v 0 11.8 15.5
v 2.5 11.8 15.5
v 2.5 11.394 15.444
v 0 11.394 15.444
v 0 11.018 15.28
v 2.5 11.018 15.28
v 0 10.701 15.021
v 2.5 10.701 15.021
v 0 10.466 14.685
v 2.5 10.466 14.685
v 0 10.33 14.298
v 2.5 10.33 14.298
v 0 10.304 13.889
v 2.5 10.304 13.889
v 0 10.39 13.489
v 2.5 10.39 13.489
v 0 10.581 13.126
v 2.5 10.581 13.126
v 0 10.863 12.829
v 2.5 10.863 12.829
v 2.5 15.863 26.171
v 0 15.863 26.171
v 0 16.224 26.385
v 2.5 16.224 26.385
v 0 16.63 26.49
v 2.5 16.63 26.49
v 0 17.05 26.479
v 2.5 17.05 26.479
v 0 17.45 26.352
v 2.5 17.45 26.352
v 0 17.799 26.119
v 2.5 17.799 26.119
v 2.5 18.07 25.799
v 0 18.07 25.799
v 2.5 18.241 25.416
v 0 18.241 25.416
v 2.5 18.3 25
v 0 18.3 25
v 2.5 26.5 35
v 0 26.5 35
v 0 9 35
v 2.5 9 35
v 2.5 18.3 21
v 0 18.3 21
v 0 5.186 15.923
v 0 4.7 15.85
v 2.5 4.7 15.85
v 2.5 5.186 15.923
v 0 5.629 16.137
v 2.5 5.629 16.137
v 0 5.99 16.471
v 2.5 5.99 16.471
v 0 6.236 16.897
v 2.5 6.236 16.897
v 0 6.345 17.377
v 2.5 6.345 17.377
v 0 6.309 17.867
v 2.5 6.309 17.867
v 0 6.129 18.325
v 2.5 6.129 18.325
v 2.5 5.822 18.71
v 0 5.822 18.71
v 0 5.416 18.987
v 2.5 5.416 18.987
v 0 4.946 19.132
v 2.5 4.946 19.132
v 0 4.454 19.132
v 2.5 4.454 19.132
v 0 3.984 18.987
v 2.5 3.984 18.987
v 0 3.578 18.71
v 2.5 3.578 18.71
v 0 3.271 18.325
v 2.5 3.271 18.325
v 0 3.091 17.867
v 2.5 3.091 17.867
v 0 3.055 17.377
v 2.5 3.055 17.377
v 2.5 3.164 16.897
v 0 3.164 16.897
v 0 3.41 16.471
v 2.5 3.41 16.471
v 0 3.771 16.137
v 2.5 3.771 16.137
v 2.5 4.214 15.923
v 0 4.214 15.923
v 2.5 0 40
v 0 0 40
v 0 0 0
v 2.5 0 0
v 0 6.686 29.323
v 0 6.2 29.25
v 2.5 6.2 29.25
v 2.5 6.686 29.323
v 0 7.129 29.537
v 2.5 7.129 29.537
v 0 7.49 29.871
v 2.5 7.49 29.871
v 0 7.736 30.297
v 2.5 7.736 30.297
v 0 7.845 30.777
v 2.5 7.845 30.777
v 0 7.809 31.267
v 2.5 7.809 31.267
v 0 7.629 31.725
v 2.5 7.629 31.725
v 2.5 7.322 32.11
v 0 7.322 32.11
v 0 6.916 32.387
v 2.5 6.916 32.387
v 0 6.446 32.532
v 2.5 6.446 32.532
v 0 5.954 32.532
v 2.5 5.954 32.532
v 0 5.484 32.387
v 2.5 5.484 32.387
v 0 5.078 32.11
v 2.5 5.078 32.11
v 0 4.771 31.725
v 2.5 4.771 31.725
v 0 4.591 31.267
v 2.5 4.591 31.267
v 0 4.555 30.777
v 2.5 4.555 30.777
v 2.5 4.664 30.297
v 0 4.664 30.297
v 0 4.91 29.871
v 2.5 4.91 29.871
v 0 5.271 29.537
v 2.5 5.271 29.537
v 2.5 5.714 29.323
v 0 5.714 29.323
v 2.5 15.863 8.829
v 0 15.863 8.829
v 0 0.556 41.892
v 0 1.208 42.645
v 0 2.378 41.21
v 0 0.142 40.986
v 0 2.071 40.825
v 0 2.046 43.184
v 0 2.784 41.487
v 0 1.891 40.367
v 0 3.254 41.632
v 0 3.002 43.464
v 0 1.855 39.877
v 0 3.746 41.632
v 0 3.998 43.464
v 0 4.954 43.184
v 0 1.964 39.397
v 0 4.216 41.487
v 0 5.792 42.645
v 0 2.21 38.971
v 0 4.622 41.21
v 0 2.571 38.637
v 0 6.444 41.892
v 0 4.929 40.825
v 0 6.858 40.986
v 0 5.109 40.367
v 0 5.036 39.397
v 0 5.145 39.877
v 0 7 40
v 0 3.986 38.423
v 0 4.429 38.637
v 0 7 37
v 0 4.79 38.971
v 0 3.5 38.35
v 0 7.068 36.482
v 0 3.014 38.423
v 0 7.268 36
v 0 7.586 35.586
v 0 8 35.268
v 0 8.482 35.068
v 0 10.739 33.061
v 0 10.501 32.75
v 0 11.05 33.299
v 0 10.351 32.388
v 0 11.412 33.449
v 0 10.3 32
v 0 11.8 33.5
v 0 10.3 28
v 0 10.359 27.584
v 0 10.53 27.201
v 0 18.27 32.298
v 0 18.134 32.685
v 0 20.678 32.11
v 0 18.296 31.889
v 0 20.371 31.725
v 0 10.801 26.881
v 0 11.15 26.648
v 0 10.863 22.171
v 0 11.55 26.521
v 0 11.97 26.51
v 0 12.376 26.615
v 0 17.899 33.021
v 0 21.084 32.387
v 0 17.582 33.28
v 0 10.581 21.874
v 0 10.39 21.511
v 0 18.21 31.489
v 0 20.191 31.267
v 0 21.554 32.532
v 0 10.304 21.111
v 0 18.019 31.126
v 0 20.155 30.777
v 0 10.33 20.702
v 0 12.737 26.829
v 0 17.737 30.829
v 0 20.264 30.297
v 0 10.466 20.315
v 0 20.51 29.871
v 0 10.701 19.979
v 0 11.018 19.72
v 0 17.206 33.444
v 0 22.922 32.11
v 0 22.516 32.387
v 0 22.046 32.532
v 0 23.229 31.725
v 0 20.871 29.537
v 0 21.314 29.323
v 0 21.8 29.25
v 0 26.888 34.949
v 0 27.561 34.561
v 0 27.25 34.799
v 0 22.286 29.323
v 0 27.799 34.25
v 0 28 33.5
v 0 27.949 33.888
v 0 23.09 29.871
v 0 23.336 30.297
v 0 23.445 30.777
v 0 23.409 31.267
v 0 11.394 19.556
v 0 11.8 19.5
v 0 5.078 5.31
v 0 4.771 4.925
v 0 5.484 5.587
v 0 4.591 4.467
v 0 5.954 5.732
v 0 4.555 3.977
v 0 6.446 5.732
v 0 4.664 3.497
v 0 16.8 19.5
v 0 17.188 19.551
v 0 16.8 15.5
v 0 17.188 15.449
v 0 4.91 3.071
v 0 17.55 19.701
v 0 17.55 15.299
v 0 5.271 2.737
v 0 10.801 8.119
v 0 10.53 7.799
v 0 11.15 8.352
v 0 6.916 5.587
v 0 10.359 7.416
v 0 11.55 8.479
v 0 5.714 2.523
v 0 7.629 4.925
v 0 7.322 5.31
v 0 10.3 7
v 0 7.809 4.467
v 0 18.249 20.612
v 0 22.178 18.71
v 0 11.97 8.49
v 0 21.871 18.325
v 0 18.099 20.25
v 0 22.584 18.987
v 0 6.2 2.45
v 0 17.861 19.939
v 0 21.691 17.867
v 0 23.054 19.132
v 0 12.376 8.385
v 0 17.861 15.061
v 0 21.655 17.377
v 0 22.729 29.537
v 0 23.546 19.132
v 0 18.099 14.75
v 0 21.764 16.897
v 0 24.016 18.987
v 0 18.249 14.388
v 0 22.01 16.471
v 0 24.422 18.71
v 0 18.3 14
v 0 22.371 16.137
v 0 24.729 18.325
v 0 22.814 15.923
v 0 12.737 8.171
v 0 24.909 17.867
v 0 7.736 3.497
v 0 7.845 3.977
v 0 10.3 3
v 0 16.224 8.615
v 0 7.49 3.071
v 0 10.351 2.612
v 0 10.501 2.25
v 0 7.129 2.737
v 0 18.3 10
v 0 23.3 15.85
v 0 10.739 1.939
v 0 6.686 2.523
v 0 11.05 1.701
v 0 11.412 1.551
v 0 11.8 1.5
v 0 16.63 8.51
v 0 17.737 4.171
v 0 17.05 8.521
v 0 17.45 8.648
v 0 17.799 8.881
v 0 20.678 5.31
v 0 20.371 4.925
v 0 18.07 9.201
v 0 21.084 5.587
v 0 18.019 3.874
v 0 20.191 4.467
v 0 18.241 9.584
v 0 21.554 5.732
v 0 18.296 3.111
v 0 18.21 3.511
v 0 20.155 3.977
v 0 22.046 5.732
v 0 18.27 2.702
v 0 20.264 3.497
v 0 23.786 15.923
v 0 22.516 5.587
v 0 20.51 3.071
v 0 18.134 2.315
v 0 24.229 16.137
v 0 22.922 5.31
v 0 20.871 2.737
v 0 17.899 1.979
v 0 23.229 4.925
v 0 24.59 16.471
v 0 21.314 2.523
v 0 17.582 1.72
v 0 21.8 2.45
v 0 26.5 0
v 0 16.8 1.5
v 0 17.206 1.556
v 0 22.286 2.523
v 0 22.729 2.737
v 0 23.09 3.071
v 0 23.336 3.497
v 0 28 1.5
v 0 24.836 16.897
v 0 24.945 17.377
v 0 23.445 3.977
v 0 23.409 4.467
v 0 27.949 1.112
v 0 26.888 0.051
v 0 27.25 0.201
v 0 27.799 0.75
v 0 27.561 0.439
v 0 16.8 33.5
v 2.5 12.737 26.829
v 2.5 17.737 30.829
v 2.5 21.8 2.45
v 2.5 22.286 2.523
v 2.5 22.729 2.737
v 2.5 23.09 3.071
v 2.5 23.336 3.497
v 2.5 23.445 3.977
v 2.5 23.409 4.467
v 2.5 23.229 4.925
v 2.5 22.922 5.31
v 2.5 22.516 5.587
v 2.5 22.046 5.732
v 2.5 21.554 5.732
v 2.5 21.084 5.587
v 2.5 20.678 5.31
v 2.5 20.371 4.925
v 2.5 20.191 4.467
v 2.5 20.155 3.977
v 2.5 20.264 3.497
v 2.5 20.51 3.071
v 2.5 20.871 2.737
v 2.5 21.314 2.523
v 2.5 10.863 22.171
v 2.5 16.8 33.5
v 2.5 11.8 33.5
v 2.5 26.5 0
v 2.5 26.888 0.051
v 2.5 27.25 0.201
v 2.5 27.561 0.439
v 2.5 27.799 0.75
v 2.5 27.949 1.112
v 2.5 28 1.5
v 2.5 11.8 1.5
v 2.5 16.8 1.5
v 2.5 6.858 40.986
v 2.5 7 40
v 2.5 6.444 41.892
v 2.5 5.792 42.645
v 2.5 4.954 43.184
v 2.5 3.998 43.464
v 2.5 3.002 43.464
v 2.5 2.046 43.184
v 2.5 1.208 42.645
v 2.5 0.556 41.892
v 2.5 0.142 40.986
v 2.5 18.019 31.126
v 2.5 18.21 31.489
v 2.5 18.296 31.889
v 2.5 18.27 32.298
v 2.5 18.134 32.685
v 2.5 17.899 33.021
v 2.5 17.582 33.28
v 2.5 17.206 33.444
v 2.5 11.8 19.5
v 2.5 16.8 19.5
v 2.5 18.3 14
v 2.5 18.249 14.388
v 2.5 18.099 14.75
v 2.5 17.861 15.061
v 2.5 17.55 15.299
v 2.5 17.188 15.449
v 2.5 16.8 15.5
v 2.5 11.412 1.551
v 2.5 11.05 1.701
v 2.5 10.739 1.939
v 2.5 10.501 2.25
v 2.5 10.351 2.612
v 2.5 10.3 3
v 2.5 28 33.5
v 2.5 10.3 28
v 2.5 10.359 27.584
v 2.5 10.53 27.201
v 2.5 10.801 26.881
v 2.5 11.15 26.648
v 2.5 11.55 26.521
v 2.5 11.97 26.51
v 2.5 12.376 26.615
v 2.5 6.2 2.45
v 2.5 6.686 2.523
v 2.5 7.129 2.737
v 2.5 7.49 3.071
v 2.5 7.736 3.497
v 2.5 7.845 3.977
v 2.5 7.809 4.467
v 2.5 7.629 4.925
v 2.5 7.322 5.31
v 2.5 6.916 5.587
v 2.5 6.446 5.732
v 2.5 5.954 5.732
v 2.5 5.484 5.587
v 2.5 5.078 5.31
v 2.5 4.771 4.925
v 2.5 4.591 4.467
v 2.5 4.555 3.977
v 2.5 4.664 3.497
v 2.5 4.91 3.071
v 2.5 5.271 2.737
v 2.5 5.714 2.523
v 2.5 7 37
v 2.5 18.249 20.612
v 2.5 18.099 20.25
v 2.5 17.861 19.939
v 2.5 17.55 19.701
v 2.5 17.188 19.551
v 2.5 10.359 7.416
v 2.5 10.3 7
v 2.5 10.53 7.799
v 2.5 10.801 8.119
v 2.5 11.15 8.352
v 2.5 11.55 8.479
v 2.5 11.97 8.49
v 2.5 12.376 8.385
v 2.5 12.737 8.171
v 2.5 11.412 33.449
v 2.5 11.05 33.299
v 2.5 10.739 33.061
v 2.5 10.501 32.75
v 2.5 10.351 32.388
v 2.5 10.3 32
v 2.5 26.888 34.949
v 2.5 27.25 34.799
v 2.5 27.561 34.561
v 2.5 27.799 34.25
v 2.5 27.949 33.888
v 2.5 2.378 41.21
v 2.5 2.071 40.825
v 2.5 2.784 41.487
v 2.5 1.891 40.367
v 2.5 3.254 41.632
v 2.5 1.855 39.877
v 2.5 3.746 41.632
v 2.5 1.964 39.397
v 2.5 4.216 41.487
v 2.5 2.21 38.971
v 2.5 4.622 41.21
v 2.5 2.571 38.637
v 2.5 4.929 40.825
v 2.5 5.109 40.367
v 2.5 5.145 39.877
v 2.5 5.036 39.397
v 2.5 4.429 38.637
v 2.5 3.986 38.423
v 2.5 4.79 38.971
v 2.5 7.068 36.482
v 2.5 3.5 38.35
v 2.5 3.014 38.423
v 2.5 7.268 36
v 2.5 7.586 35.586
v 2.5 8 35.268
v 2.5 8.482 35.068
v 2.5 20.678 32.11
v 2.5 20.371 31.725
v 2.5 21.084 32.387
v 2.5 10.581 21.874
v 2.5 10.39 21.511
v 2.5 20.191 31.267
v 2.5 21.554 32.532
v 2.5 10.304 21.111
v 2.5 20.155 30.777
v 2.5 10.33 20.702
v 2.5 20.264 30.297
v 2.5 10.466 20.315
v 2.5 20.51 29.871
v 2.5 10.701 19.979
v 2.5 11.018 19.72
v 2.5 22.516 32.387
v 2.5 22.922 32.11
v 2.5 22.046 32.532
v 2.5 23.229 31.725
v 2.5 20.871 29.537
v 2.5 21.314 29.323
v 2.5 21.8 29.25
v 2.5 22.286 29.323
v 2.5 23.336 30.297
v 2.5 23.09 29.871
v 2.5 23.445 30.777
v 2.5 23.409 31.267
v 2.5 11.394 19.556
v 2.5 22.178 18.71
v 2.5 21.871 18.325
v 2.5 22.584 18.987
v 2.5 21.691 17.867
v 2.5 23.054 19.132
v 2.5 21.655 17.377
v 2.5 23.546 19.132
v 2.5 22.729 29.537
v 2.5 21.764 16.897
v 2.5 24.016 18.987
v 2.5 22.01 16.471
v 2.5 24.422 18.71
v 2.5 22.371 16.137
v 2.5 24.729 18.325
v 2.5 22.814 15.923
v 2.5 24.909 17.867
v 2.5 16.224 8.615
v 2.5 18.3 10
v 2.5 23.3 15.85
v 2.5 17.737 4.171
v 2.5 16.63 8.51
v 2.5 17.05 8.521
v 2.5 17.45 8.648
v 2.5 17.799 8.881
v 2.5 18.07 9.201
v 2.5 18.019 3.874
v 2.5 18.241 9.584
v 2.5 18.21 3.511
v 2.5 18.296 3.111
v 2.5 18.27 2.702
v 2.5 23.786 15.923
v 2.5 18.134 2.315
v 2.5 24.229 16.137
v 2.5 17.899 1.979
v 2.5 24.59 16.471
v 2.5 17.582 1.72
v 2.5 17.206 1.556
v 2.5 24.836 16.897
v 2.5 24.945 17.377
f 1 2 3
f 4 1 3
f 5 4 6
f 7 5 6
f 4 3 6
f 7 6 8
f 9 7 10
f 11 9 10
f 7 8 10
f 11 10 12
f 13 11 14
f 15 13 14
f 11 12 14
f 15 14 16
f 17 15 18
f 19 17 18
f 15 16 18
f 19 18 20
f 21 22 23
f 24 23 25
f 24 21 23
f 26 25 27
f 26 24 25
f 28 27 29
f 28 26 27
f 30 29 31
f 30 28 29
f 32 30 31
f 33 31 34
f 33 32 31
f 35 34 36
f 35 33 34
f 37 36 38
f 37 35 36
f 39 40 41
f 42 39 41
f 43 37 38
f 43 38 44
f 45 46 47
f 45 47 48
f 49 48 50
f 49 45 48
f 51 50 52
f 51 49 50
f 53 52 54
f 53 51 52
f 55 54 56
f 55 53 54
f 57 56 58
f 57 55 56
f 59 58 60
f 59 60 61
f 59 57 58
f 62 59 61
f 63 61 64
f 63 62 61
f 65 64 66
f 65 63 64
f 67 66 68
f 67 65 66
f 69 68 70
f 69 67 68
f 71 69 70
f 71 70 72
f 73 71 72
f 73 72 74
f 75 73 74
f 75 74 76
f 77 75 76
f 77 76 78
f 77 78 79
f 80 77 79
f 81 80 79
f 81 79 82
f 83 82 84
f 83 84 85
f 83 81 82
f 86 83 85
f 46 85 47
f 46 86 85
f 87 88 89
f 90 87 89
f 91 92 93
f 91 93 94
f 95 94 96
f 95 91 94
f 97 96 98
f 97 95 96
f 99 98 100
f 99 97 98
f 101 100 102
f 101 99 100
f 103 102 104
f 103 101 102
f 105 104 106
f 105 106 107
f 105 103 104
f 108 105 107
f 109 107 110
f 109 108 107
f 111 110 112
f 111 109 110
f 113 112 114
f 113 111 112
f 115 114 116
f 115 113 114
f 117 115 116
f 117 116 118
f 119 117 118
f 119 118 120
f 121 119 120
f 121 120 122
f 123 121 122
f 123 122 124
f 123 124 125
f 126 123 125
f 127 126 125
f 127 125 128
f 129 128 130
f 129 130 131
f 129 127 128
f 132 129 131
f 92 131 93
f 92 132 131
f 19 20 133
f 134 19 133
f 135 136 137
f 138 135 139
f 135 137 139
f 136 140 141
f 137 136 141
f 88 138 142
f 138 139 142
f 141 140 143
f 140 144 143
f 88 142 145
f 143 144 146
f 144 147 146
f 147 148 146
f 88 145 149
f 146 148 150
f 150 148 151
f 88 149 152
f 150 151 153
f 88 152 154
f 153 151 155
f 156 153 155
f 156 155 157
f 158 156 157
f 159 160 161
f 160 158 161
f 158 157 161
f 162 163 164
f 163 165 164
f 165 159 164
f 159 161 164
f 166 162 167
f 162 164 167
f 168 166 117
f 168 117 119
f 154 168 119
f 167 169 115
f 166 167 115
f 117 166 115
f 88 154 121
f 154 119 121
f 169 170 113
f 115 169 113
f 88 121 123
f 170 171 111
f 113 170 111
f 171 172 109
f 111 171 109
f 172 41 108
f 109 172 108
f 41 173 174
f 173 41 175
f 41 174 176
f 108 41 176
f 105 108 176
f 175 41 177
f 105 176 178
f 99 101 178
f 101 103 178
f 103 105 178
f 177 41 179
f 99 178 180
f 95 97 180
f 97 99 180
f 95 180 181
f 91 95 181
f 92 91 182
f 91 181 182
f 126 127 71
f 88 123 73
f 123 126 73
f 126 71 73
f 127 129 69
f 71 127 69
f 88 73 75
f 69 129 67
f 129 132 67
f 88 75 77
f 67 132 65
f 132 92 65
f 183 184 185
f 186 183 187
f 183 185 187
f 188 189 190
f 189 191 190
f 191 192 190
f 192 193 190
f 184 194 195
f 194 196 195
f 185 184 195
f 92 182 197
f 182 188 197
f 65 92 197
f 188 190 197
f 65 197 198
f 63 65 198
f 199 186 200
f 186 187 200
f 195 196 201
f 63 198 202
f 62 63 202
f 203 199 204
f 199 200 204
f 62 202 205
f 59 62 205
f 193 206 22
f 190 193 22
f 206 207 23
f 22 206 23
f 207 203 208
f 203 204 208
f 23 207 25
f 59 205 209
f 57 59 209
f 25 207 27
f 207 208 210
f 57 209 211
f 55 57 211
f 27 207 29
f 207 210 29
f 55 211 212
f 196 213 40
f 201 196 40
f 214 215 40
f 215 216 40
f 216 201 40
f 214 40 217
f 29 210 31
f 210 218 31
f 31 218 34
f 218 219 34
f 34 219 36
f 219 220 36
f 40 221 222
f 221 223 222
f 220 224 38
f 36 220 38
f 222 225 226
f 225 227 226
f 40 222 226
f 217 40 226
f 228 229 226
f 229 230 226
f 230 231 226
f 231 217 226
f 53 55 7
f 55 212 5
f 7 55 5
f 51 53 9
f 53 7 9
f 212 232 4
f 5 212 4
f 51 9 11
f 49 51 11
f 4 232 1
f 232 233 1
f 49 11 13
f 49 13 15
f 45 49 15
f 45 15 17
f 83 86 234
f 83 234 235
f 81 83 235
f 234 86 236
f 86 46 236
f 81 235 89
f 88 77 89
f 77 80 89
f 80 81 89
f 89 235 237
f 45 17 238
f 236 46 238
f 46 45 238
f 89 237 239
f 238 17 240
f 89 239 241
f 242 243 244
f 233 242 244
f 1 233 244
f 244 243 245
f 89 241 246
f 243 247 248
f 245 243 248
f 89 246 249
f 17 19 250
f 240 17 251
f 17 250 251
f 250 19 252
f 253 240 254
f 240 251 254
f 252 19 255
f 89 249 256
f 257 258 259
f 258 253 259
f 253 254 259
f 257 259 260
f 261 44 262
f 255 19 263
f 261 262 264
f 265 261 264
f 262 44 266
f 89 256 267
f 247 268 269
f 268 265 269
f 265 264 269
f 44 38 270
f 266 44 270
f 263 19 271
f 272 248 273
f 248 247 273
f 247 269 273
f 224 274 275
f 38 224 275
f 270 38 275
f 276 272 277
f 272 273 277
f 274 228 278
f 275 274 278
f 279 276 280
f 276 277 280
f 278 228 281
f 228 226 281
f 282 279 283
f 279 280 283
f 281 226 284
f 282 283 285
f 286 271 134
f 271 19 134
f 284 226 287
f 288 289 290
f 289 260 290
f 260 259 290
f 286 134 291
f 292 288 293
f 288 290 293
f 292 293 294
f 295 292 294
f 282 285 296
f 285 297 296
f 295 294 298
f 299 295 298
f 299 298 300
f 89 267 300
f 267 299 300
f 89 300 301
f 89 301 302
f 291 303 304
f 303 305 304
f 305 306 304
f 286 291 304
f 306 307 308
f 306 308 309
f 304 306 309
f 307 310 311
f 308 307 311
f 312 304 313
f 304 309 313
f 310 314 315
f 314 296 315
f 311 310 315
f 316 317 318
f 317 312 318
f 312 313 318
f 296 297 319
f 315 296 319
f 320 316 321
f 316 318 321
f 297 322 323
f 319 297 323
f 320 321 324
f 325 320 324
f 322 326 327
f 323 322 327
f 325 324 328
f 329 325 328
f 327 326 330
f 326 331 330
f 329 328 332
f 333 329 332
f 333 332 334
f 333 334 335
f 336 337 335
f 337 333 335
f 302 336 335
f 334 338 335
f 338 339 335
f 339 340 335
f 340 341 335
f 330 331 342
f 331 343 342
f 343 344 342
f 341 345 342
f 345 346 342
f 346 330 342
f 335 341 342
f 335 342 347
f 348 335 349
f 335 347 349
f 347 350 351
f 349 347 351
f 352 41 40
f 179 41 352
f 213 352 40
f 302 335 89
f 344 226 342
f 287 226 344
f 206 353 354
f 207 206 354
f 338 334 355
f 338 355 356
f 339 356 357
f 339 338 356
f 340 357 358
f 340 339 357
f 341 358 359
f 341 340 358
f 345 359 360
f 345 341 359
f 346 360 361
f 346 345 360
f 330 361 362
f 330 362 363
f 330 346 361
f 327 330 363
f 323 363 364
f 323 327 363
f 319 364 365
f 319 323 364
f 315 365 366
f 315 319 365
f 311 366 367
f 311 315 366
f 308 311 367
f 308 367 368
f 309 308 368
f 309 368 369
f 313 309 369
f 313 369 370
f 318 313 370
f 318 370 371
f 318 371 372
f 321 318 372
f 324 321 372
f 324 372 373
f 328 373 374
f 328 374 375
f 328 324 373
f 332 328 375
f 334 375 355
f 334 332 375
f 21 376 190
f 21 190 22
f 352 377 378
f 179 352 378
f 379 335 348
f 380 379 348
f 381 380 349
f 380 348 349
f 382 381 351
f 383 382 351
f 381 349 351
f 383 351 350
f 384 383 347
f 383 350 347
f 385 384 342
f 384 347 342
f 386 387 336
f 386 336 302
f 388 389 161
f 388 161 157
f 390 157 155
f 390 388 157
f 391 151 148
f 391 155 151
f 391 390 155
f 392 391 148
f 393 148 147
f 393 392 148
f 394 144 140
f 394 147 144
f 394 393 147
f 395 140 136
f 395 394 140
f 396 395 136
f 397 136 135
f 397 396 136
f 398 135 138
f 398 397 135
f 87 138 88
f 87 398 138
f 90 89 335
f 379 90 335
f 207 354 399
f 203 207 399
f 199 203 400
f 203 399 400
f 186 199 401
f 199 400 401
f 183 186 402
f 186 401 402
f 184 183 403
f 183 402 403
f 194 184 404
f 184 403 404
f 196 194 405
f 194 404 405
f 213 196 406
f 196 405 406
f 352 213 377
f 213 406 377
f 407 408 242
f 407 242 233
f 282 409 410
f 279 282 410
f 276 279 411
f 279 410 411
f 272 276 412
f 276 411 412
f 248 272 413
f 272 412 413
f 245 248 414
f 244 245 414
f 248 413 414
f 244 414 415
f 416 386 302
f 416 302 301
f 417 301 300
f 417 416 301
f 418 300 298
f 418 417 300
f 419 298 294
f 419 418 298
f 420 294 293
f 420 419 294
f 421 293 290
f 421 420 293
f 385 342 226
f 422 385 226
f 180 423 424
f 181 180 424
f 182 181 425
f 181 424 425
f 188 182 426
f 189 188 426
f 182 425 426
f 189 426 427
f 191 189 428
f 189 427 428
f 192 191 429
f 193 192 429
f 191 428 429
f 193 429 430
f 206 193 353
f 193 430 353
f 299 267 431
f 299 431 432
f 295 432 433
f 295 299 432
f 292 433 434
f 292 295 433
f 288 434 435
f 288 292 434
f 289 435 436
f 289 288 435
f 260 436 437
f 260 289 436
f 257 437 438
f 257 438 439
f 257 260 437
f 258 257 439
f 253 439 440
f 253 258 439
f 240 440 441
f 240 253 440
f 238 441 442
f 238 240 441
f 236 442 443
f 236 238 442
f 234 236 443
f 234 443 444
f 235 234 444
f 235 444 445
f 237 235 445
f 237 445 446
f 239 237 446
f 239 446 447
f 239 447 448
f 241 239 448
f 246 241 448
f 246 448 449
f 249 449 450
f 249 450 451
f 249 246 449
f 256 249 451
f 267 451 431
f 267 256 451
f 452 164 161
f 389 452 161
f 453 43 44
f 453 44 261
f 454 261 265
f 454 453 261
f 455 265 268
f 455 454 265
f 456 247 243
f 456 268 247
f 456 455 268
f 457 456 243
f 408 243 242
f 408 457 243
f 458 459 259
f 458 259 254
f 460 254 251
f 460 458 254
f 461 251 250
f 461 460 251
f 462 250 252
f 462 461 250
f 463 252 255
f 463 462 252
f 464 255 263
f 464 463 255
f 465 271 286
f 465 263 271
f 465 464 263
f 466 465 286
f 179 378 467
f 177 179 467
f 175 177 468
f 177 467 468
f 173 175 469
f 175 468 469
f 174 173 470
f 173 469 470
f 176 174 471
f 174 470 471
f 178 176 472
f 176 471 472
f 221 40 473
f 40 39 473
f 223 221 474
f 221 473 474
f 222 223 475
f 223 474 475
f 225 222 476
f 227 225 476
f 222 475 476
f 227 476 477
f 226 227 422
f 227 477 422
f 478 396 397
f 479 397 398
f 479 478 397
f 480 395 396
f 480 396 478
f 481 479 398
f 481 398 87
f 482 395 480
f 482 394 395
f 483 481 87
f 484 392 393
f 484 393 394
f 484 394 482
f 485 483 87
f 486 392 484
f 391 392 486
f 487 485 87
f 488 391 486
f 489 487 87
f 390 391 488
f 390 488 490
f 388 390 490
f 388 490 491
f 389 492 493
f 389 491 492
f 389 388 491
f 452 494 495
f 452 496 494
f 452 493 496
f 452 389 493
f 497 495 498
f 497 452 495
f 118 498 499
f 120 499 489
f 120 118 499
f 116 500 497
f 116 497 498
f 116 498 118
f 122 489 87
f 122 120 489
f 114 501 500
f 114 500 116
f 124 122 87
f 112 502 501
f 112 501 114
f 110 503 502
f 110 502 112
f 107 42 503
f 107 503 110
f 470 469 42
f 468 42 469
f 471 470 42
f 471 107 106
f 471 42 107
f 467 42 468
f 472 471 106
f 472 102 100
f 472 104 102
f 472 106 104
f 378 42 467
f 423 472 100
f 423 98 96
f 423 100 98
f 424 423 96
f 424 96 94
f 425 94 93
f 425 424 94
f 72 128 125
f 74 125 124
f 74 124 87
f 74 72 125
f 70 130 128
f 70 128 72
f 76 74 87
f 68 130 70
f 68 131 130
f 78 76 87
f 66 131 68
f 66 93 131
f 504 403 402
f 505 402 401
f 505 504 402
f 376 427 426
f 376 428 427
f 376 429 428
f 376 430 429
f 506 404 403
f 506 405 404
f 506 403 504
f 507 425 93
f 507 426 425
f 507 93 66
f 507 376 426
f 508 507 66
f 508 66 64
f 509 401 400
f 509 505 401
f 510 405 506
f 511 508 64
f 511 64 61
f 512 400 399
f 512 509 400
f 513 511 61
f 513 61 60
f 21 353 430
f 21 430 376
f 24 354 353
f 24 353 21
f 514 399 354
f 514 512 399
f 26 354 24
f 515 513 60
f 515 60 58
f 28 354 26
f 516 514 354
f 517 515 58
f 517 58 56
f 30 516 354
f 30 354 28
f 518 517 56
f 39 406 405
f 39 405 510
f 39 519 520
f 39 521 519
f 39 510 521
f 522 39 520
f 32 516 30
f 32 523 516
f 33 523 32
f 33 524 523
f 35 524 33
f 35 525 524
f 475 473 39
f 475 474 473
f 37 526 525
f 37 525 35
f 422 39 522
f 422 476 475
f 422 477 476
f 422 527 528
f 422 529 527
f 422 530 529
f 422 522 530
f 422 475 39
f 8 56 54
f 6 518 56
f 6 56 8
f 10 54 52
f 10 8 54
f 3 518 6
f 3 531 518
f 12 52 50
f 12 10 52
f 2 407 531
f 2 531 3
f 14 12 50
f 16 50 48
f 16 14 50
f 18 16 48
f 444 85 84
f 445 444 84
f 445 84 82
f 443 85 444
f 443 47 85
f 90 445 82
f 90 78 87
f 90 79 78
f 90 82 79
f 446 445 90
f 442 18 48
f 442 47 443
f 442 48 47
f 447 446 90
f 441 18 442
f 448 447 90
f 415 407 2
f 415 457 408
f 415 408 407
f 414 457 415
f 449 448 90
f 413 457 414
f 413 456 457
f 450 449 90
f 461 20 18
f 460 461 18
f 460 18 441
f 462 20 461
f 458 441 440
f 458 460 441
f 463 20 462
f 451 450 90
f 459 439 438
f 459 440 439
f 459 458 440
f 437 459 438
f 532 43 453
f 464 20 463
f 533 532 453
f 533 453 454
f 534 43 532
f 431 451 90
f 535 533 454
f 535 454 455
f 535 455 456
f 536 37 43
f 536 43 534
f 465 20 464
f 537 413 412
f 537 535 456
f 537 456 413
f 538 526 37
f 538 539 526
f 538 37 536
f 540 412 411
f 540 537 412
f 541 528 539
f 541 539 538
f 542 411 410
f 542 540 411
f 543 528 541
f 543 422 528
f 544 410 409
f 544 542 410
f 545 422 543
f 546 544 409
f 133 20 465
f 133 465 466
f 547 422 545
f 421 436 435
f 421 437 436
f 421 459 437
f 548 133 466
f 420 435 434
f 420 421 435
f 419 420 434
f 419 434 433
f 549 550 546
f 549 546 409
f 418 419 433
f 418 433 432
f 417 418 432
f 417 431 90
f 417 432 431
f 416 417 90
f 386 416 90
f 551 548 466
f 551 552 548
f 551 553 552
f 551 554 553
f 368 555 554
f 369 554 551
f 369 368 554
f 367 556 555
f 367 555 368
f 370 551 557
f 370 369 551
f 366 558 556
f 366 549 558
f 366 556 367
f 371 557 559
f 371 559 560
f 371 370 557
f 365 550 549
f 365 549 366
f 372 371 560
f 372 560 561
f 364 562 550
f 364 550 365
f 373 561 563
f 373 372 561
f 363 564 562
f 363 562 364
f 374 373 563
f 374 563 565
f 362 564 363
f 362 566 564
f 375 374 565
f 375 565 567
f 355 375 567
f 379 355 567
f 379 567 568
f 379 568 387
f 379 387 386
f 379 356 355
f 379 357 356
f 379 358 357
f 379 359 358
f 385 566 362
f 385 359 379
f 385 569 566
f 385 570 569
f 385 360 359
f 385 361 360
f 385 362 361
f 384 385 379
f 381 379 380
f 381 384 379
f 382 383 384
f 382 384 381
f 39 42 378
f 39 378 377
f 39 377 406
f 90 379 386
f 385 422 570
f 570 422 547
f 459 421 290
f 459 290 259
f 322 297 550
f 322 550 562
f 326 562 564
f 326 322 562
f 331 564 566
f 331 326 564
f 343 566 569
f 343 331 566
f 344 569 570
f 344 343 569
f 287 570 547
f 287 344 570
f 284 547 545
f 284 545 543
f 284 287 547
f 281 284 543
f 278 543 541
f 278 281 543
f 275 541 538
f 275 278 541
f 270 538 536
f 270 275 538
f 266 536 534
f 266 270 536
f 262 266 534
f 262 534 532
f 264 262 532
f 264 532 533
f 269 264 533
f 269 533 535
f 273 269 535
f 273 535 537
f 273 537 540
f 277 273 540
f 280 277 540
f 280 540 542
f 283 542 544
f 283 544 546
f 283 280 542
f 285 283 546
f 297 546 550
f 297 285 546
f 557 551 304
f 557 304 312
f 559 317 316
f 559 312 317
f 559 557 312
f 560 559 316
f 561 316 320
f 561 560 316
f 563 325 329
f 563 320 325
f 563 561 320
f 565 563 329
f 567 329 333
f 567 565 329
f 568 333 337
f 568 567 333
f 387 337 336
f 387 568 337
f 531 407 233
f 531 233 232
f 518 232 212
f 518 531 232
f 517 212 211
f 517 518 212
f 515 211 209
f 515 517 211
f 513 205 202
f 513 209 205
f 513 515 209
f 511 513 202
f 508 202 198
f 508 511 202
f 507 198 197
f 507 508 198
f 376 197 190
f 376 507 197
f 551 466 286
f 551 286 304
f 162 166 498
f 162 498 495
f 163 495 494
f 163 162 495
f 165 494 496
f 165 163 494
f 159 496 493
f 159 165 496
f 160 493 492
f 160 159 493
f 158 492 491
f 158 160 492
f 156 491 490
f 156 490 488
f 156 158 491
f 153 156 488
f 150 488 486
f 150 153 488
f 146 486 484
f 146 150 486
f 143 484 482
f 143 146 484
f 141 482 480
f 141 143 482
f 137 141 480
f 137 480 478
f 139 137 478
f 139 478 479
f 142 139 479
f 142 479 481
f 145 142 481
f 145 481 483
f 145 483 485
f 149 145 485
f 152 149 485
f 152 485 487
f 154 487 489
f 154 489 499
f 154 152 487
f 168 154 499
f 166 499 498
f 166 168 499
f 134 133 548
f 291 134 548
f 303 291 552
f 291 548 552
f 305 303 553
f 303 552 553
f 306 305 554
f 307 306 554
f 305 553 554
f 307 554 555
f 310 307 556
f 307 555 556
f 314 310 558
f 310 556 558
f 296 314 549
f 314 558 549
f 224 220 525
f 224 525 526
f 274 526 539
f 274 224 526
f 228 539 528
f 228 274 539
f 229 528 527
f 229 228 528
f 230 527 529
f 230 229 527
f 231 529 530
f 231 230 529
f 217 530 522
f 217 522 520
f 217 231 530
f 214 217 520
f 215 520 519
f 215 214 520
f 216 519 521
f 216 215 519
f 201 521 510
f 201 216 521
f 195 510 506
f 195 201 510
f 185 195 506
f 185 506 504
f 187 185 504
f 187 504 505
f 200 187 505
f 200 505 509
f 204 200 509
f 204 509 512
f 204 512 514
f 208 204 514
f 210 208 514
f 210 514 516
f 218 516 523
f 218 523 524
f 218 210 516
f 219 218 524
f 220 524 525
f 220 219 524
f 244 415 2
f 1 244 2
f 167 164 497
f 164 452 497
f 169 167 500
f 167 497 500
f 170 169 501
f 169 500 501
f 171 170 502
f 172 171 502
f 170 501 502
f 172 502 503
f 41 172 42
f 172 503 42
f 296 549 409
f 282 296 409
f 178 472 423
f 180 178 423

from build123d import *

# Parameters (mm, degrees)
IZIM1_R                     = 1.65
Y_KSEKLIK_EKSTR_ZYON1_DEPTH = 2.5
RADYUS1_RADIUS              = 3.5
RADYUS1_LENGTH              = 2.5
RADYUS3_R                   = 2
RADYUS4_R                   = 1.5
KES_EKSTR_ZYON1_DEPTH       = 52.79285665


with BuildPart() as part:
    # Çizim1 → Yükseklik-Ekstrüzyon1 (new body)
    with BuildSketch(Plane(origin=(0, 0, 0), x_dir=(0, 0, -1), z_dir=(1, 0, 0))):
        with BuildLine():
            Line((0, 0), (0, 26.5))
            ThreePointArc((0, 26.5), (-0.439339828, 27.560660172), (-1.5, 28))
            Line((-1.5, 28), (-35, 28))
            Line((-35, 28), (-35, 7))
            Line((-35, 7), (-43.5, 7))
            Line((-43.5, 7), (-43.5, 0))
            Line((-43.5, 0), (0, 0))
        make_face()
        with Locations((-17.5, 23.3)):
            Circle(IZIM1_R, mode=Mode.SUBTRACT)
        with Locations((-17.5, 4.7)):
            Circle(IZIM1_R, mode=Mode.SUBTRACT)
        with Locations((-30.9, 6.2)):
            Circle(IZIM1_R, mode=Mode.SUBTRACT)
        with Locations((-30.9, 21.8)):
            Circle(IZIM1_R, mode=Mode.SUBTRACT)
        with Locations((-4.1, 6.2)):
            Circle(IZIM1_R, mode=Mode.SUBTRACT)
        with Locations((-4.1, 21.8)):
            Circle(IZIM1_R, mode=Mode.SUBTRACT)
        with Locations((-40, 3.5)):
            Circle(IZIM1_R, mode=Mode.SUBTRACT)
    extrude(amount=Y_KSEKLIK_EKSTR_ZYON1_DEPTH)

    # Radyus1: full round fillet: the end face becomes a half cylinder, R = half its width
    radyus1_face = Plane((1.25, 3.5, 43.5), x_dir=(1, 0, 0), z_dir=(0, 0, 1))  # on the end face: x along it, z out of the body
    radyus1_slab = radyus1_face.offset(-RADYUS1_RADIUS / 2) * Box(RADYUS1_LENGTH, 2 * RADYUS1_RADIUS, RADYUS1_RADIUS, mode=Mode.PRIVATE)  # the body's end, R deep
    radyus1_round = Plane((1.25, 3.5, 40), x_dir=(0, 0, 1), z_dir=(1, 0, 0)) * Cylinder(RADYUS1_RADIUS, RADYUS1_LENGTH, mode=Mode.PRIVATE)  # its axis R under the face
    add(radyus1_slab - radyus1_round, mode=Mode.SUBTRACT)

    # Radyus3
    radyus3_edges = [part.edges().sort_by_distance(p)[0] for p in [
        (1.25, 7, 35),
    ]]
    fillet(radyus3_edges, radius=RADYUS3_R)

    # Radyus4
    radyus4_edges = [part.edges().sort_by_distance(p)[0] for p in [
        (1.25, 28, 35),
    ]]
    fillet(radyus4_edges, radius=RADYUS4_R)

    # Çizim2 → Kes-Ekstrüzyon1 (cut, through all)
    with BuildSketch(Plane(origin=(2.5, 0, 0), x_dir=(0, 0, -1), z_dir=(1, 0, 0))):
        with BuildLine():
            Line((-33.5, 16.8), (-33.5, 11.8))
            ThreePointArc((-33.5, 11.8), (-33.060660172, 10.739339828), (-32, 10.3))
            Line((-32, 10.3), (-28, 10.3))
            ThreePointArc((-28, 10.3), (-26.648045146, 11.150216904), (-26.828696786, 12.737042571))
            Line((-26.828696786, 12.737042571), (-30.828696786, 17.737042571))
            ThreePointArc((-30.828696786, 17.737042571), (-32.496510412, 18.215442479), (-33.5, 16.8))
        make_face()
        with BuildLine():
            Line((-25, 18.3), (-21, 18.3))
            ThreePointArc((-21, 18.3), (-19.939339828, 17.860660172), (-19.5, 16.8))
            Line((-19.5, 16.8), (-19.5, 11.8))
            ThreePointArc((-19.5, 11.8), (-20.503489588, 10.384557521), (-22.171303214, 10.862957429))
            Line((-22.171303214, 10.862957429), (-26.171303214, 15.862957429))
            ThreePointArc((-26.171303214, 15.862957429), (-26.351954854, 17.449783096), (-25, 18.3))
        make_face()
        with BuildLine():
            Line((-12.828696786, 10.862957429), (-8.828696786, 15.862957429))
            ThreePointArc((-8.828696786, 15.862957429), (-8.648045146, 17.449783096), (-10, 18.3))
            Line((-10, 18.3), (-14, 18.3))
            ThreePointArc((-14, 18.3), (-15.060660172, 17.860660172), (-15.5, 16.8))
            Line((-15.5, 16.8), (-15.5, 11.8))
            ThreePointArc((-15.5, 11.8), (-14.496510412, 10.384557521), (-12.828696786, 10.862957429))
        make_face()
        with BuildLine():
            Line((-8.171303214, 12.737042571), (-4.171303214, 17.737042571))
            ThreePointArc((-4.171303214, 17.737042571), (-2.503489588, 18.215442479), (-1.5, 16.8))
            Line((-1.5, 16.8), (-1.5, 11.8))
            ThreePointArc((-1.5, 11.8), (-1.939339828, 10.739339828), (-3, 10.3))
            Line((-3, 10.3), (-7, 10.3))
            ThreePointArc((-7, 10.3), (-8.351954854, 11.150216904), (-8.171303214, 12.737042571))
        make_face()
    extrude(amount=-KES_EKSTR_ZYON1_DEPTH, mode=Mode.SUBTRACT)


solid = part.part
